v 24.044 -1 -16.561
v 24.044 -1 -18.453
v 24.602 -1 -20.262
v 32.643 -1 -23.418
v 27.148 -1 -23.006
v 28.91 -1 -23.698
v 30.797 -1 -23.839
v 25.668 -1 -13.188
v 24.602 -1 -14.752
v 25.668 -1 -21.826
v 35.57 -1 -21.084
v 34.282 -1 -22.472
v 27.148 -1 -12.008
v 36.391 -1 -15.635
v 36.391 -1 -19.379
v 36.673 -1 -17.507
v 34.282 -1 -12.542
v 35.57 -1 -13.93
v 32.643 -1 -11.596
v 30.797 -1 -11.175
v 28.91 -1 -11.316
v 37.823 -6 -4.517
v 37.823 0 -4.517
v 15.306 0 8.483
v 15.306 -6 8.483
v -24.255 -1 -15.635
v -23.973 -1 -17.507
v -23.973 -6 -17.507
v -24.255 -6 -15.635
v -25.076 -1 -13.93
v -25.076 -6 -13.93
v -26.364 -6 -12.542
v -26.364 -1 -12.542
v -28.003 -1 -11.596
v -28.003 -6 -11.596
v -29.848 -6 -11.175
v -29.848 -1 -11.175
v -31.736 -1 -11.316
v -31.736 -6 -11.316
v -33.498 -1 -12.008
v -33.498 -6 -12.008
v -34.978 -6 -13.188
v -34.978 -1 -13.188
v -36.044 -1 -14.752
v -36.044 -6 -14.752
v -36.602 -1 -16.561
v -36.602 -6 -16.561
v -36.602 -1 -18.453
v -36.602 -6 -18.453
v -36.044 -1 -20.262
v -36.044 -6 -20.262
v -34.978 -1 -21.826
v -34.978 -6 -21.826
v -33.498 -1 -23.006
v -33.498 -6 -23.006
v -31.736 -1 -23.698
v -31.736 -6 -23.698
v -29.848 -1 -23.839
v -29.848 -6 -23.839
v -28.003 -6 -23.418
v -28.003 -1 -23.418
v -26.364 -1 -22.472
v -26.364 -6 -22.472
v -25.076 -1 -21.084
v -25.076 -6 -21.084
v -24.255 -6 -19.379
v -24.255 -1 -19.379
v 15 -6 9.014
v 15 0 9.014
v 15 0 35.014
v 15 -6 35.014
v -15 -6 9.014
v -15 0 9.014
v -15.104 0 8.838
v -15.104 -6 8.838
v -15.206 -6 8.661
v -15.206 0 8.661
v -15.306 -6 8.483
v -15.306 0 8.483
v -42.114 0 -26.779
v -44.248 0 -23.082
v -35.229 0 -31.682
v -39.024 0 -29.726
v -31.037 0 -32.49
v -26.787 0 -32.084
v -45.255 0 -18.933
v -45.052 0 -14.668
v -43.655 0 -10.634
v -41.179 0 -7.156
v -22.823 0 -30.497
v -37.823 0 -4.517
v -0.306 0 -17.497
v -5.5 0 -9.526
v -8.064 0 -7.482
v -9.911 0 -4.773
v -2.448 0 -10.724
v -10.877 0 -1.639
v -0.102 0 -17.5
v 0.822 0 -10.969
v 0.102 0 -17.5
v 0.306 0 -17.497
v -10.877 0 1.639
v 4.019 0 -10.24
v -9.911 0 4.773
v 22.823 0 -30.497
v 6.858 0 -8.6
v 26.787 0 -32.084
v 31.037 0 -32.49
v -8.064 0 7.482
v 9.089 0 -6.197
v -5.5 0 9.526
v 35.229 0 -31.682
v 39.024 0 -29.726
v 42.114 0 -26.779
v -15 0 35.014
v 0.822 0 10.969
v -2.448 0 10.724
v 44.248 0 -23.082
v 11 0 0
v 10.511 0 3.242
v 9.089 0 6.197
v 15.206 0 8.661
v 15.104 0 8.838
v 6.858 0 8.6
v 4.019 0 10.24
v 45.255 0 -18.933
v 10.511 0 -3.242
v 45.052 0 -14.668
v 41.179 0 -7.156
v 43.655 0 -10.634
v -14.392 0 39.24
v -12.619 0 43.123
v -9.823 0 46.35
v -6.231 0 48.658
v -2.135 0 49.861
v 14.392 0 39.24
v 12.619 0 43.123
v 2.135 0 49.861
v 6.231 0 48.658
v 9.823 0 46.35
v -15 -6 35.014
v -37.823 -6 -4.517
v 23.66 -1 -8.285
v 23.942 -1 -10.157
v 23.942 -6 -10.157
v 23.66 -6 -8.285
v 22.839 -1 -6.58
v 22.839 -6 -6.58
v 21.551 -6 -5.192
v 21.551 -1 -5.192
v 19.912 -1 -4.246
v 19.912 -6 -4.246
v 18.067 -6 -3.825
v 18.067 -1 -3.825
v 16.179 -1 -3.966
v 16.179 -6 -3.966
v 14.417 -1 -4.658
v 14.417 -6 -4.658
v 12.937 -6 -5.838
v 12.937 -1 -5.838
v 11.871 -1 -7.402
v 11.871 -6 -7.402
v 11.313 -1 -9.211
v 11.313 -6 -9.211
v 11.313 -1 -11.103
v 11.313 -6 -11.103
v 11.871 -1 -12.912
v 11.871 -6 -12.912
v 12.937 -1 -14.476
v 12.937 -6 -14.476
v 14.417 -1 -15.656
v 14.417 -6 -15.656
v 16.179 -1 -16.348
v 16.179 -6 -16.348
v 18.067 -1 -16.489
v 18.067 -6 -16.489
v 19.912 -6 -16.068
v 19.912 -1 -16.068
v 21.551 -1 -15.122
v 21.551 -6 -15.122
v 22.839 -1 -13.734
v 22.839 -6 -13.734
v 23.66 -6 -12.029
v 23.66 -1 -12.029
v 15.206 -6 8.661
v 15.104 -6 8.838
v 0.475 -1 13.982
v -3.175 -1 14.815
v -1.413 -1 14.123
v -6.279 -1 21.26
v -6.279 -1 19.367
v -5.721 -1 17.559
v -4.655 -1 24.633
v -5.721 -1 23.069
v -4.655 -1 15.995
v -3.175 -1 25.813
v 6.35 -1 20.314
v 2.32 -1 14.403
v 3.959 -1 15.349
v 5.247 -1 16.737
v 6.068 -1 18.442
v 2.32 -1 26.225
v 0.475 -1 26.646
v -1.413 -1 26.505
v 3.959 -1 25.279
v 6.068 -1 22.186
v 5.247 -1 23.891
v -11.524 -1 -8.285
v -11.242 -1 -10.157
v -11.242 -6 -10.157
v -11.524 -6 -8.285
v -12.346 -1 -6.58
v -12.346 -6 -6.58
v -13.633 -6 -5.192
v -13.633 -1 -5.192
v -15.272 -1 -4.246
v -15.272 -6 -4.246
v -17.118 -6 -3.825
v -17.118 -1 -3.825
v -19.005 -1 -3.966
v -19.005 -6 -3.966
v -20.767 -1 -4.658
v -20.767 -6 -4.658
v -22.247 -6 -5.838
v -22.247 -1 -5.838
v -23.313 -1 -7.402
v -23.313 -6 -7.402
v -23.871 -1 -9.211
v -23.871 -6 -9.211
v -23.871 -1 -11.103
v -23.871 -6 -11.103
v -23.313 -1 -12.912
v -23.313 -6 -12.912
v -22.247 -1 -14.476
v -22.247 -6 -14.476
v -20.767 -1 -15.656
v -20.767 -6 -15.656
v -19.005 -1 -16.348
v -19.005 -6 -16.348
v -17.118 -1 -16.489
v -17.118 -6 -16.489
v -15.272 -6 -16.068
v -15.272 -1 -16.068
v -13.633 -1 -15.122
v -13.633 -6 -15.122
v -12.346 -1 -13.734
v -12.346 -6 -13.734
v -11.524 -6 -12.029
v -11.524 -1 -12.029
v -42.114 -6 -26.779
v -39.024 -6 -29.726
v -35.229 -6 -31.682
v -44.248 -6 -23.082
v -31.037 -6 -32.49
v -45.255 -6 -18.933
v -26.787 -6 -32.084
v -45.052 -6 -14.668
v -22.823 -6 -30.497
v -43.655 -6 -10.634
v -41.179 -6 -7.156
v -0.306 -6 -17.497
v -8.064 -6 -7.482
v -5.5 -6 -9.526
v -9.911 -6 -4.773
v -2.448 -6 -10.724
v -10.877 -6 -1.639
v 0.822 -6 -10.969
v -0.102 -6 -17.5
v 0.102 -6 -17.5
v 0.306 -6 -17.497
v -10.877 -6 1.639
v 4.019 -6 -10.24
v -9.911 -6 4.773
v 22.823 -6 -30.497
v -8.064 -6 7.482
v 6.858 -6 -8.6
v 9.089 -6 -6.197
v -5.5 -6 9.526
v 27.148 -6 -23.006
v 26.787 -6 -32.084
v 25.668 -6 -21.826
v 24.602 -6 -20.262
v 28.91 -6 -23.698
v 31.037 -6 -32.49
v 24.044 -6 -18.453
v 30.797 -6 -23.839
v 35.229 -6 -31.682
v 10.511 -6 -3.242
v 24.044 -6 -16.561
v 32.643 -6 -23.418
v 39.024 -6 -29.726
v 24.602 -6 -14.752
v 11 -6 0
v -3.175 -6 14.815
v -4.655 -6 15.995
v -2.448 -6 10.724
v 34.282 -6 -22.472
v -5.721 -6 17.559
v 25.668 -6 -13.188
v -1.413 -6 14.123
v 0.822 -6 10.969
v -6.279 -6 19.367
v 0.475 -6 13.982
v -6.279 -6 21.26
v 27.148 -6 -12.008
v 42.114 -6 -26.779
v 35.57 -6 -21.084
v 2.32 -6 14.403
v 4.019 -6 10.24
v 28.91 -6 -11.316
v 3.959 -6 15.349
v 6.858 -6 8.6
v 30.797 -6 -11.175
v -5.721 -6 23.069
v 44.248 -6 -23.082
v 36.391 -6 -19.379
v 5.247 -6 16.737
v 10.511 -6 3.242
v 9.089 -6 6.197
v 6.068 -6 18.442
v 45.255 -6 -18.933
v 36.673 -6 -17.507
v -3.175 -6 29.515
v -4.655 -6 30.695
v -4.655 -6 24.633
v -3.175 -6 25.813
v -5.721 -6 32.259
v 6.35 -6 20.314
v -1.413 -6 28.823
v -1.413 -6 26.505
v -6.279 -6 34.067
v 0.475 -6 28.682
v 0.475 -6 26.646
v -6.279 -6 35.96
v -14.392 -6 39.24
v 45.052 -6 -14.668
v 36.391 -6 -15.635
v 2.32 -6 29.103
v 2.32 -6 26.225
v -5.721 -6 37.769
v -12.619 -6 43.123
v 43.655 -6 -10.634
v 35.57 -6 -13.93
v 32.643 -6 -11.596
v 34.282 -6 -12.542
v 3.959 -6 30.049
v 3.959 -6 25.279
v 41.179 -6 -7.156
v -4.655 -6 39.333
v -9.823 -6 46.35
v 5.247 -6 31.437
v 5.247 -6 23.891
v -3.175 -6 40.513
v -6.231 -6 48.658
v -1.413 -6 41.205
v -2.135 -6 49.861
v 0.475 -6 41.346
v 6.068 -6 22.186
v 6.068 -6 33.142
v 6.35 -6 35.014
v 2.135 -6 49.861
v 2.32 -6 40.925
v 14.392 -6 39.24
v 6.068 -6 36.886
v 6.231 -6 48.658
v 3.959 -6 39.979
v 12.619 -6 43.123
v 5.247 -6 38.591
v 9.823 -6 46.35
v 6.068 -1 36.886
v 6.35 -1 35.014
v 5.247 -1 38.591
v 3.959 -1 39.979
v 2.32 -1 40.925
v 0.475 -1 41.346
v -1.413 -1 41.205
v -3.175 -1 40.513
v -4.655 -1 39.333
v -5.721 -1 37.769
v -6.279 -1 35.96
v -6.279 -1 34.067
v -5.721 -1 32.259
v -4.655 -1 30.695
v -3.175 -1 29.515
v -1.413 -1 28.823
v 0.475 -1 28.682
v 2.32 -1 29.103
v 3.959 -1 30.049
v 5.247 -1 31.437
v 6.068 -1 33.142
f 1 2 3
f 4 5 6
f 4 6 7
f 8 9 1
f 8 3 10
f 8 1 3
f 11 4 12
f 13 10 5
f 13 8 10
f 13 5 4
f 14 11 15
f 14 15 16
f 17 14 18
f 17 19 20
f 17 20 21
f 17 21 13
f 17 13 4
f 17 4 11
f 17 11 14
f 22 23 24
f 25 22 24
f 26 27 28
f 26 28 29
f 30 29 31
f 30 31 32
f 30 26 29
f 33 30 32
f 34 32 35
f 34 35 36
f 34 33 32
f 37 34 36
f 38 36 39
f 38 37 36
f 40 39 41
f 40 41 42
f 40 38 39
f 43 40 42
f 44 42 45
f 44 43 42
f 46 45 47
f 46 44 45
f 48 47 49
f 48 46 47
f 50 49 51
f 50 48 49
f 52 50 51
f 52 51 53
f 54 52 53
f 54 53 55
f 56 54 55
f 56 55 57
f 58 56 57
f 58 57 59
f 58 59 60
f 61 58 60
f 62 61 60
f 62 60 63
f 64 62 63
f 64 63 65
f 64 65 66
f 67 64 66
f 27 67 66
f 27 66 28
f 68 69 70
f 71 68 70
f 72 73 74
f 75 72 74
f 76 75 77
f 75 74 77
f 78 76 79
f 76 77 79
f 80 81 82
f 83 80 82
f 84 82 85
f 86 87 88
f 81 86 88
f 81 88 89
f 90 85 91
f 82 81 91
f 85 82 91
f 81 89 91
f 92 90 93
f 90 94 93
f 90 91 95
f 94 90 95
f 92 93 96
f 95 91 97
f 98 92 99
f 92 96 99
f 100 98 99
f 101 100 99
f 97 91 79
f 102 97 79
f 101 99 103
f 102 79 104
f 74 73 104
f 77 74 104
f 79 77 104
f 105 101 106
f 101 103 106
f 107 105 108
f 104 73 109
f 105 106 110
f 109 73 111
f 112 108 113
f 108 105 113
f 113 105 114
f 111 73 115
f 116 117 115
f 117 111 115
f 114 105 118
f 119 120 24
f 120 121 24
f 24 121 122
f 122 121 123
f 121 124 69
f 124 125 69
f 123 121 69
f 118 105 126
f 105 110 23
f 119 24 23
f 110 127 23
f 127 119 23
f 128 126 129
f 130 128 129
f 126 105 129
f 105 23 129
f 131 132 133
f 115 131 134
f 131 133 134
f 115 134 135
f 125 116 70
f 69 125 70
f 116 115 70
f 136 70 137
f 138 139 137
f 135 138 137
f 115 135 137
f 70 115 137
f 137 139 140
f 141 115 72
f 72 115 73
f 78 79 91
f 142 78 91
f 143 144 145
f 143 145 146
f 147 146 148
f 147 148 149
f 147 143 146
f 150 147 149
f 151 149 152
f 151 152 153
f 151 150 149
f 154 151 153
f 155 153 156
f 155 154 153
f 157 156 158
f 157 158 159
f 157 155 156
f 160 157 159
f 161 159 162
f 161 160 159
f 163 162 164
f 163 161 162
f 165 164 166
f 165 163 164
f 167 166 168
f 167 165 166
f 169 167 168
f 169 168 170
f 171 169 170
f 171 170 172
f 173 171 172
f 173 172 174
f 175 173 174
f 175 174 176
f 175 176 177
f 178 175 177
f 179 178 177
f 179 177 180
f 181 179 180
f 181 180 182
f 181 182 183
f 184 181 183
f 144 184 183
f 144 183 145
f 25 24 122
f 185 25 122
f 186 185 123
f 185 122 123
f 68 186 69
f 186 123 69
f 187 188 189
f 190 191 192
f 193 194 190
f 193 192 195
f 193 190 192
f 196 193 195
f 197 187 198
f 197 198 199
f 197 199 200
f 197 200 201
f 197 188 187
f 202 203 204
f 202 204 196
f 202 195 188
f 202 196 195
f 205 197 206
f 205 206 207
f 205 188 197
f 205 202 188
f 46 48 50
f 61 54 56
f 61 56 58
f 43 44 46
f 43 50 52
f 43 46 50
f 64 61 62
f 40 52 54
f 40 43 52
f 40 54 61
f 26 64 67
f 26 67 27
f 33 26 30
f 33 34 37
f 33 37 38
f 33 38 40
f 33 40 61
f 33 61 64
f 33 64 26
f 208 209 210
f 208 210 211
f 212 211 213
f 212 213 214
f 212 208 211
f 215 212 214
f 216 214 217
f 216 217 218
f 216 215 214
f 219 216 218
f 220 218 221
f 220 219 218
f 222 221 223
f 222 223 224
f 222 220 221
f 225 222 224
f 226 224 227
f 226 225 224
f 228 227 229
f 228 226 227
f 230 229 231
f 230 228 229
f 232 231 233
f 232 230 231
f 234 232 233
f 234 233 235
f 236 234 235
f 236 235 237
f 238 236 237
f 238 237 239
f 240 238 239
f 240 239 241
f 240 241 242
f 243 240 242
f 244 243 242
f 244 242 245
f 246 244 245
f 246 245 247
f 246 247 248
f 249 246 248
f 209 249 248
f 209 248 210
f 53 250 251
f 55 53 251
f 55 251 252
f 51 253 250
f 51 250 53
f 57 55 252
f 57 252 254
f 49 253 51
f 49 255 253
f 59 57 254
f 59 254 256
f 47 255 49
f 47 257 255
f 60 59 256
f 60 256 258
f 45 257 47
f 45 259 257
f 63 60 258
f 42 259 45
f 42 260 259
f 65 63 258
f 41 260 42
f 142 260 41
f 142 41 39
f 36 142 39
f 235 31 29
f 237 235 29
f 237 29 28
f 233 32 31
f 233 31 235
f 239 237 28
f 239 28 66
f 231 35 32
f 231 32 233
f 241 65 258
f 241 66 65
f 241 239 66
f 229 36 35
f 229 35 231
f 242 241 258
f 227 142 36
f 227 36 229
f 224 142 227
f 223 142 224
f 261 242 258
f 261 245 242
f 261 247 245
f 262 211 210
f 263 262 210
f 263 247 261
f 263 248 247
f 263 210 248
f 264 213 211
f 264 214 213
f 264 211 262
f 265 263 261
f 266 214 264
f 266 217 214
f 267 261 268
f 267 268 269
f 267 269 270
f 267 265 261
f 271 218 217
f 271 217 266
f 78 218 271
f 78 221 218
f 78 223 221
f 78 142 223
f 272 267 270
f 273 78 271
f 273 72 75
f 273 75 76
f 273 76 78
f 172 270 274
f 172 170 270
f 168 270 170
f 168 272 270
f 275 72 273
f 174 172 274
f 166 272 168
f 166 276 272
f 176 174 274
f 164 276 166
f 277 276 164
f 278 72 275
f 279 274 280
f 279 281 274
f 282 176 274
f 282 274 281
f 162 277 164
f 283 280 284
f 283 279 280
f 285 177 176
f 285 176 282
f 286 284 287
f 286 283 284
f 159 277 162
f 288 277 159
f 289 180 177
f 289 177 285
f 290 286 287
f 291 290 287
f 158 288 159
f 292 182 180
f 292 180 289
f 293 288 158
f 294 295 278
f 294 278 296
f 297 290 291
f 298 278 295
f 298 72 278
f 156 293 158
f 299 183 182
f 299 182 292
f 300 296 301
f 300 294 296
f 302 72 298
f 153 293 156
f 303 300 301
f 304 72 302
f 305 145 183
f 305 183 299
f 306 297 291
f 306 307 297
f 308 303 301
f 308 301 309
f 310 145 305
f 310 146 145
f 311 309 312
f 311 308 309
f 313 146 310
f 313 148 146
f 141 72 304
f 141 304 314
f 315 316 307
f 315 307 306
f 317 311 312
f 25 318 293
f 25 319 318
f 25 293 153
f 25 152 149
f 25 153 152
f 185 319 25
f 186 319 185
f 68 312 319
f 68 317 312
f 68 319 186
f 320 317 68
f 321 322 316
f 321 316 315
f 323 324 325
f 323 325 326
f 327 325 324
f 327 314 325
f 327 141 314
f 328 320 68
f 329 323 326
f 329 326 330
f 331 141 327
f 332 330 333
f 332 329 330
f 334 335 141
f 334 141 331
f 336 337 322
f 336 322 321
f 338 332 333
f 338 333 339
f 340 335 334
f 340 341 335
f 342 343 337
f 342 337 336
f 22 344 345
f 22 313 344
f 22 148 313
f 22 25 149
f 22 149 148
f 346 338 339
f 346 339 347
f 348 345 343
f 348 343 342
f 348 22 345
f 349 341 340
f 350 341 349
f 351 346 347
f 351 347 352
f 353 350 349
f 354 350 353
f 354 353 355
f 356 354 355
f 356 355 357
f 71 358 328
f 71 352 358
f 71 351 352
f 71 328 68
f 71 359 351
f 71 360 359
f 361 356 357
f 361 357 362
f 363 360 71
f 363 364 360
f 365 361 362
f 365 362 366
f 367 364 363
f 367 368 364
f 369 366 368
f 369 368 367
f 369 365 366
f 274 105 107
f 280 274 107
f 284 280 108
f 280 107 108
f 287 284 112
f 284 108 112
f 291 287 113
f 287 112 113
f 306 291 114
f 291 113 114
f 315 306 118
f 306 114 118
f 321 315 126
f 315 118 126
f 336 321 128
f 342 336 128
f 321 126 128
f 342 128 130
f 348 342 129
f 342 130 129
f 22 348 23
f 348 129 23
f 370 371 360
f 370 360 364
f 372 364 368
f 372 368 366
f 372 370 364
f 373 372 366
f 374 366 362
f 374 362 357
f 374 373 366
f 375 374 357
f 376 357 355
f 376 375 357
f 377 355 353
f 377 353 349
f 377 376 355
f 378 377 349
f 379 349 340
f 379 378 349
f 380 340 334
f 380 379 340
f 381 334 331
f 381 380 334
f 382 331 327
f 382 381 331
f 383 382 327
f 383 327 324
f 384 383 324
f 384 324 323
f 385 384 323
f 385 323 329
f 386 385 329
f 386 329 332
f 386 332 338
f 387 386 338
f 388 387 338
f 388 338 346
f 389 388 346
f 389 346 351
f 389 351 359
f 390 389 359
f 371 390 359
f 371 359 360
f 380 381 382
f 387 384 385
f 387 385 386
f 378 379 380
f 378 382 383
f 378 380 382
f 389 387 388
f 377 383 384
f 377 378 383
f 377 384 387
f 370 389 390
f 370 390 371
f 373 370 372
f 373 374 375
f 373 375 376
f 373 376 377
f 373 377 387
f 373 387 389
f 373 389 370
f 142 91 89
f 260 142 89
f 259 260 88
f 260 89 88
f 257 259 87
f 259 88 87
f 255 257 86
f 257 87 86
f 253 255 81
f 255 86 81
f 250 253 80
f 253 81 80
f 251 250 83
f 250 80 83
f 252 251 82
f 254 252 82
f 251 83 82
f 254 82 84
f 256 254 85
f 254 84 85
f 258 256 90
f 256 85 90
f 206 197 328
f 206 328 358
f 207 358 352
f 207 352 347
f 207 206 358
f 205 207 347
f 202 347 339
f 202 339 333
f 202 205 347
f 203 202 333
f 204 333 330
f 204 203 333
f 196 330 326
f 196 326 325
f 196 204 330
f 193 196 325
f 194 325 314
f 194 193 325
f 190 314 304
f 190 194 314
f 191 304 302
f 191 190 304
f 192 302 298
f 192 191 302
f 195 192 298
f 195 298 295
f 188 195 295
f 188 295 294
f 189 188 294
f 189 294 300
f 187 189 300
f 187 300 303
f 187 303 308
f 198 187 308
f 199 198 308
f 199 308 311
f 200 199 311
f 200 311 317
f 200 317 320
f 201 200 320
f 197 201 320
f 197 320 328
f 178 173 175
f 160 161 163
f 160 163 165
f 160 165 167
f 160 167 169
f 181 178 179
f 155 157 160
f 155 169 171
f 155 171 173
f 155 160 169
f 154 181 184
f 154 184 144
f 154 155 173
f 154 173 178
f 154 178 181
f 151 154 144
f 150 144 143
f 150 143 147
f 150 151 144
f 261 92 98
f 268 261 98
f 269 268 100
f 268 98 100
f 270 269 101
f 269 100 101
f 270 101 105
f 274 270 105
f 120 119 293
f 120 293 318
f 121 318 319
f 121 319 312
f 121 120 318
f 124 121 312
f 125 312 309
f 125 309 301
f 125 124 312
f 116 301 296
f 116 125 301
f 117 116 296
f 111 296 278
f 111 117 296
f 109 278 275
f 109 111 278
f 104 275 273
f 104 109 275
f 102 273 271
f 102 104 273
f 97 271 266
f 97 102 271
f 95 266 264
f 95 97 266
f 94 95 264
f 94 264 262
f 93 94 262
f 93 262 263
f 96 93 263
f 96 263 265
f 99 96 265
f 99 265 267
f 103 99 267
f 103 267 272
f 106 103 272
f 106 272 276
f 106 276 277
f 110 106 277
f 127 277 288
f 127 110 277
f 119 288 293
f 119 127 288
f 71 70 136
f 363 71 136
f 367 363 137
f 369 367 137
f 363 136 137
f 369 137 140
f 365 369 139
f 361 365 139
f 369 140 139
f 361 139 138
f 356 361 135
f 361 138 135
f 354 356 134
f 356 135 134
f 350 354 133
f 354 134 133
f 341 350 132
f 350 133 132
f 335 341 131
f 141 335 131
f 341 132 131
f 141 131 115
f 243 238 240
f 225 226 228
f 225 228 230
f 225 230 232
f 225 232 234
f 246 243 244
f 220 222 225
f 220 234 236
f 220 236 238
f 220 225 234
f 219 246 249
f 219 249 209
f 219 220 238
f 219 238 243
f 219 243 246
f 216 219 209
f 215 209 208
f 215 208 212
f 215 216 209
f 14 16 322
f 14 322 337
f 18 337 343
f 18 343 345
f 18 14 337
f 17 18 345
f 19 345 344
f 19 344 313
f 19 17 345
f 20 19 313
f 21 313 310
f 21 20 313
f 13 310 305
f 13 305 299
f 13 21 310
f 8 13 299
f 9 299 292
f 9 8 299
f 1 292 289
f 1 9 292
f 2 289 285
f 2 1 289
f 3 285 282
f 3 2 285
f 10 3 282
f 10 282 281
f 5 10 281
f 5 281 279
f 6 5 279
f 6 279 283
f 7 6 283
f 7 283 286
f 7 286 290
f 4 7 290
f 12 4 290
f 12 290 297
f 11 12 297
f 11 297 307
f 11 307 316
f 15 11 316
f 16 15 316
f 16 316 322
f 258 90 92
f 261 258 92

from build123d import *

# Parameters (mm, degrees)
F0_R     = 6.35
F0_R_2   = 11
F1_DEPTH = 6
F2_DEPTH = 1


# Not quite as in the source:
# - a feature names something its author has since deleted; it is built from what else it names


with BuildPart() as f1:
    # F0 (on Front) → F1 (new body)
    with BuildSketch(Plane.XZ):
        with BuildLine():
            Line((-22.8229079964, -30.4973201511), (-0.306247498, -17.4973201511))
            ThreePointArc((-0.306247498, -17.4973201511), (0, -17.5), (0.306247498, -17.4973201511))
            Line((0.306247498, -17.4973201511), (22.8229079964, -30.4973201511))
            ThreePointArc((22.8229079964, -30.4973201511), (43.3132890532, -25.0069390943), (37.8229079964, -4.5165580376))
            Line((37.8229079964, -4.5165580376), (15.306247498, 8.4834419624))
            ThreePointArc((15.306247498, 8.4834419624), (15.1554445662, 8.75), (15, 9.0138781887))
            Line((15, 9.0138781887), (15, 35.0138781887))
            ThreePointArc((15, 35.0138781887), (0, 50.0138781887), (-15, 35.0138781887))
            Line((-15, 35.0138781887), (-15, 9.0138781887))
            ThreePointArc((-15, 9.0138781887), (-15.1554445662, 8.75), (-15.306247498, 8.4834419624))
            Line((-15.306247498, 8.4834419624), (-37.8229079964, -4.5165580376))
            ThreePointArc((-37.8229079964, -4.5165580376), (-43.3132890532, -25.0069390943), (-22.8229079964, -30.4973201511))
        make_face()
        with Locations((-30.3229079964, -17.5069390943)):
            Circle(F0_R, mode=Mode.SUBTRACT)
        with Locations((-17.5923345608, -10.1569390943)):
            Circle(F0_R, mode=Mode.SUBTRACT)
        with Locations((30.3229079964, -17.5069390943)):
            Circle(F0_R, mode=Mode.SUBTRACT)
        with Locations((17.5923345608, -10.1569390943)):
            Circle(F0_R, mode=Mode.SUBTRACT)
        Circle(F0_R_2, mode=Mode.SUBTRACT)
        with Locations((0, 20.3138781887)):
            Circle(F0_R, mode=Mode.SUBTRACT)
        with Locations((0, 35.0138781887)):
            Circle(F0_R, mode=Mode.SUBTRACT)
    extrude(amount=F1_DEPTH)

    # F0 (on Front) → F2 (join)
    with BuildSketch(Plane.XZ):
        with Locations((-30.3229079964, -17.5069390943)):
            Circle(F0_R)
        with Locations((-17.5923345608, -10.1569390943)):
            Circle(F0_R)
        with Locations((17.5923345608, -10.1569390943)):
            Circle(F0_R)
        with Locations((30.3229079964, -17.5069390943)):
            Circle(F0_R)
        with Locations((0, 20.3138781887)):
            Circle(F0_R)
        with Locations((0, 35.0138781887)):
            Circle(F0_R)
    extrude(amount=F2_DEPTH)


solid = f1.part
